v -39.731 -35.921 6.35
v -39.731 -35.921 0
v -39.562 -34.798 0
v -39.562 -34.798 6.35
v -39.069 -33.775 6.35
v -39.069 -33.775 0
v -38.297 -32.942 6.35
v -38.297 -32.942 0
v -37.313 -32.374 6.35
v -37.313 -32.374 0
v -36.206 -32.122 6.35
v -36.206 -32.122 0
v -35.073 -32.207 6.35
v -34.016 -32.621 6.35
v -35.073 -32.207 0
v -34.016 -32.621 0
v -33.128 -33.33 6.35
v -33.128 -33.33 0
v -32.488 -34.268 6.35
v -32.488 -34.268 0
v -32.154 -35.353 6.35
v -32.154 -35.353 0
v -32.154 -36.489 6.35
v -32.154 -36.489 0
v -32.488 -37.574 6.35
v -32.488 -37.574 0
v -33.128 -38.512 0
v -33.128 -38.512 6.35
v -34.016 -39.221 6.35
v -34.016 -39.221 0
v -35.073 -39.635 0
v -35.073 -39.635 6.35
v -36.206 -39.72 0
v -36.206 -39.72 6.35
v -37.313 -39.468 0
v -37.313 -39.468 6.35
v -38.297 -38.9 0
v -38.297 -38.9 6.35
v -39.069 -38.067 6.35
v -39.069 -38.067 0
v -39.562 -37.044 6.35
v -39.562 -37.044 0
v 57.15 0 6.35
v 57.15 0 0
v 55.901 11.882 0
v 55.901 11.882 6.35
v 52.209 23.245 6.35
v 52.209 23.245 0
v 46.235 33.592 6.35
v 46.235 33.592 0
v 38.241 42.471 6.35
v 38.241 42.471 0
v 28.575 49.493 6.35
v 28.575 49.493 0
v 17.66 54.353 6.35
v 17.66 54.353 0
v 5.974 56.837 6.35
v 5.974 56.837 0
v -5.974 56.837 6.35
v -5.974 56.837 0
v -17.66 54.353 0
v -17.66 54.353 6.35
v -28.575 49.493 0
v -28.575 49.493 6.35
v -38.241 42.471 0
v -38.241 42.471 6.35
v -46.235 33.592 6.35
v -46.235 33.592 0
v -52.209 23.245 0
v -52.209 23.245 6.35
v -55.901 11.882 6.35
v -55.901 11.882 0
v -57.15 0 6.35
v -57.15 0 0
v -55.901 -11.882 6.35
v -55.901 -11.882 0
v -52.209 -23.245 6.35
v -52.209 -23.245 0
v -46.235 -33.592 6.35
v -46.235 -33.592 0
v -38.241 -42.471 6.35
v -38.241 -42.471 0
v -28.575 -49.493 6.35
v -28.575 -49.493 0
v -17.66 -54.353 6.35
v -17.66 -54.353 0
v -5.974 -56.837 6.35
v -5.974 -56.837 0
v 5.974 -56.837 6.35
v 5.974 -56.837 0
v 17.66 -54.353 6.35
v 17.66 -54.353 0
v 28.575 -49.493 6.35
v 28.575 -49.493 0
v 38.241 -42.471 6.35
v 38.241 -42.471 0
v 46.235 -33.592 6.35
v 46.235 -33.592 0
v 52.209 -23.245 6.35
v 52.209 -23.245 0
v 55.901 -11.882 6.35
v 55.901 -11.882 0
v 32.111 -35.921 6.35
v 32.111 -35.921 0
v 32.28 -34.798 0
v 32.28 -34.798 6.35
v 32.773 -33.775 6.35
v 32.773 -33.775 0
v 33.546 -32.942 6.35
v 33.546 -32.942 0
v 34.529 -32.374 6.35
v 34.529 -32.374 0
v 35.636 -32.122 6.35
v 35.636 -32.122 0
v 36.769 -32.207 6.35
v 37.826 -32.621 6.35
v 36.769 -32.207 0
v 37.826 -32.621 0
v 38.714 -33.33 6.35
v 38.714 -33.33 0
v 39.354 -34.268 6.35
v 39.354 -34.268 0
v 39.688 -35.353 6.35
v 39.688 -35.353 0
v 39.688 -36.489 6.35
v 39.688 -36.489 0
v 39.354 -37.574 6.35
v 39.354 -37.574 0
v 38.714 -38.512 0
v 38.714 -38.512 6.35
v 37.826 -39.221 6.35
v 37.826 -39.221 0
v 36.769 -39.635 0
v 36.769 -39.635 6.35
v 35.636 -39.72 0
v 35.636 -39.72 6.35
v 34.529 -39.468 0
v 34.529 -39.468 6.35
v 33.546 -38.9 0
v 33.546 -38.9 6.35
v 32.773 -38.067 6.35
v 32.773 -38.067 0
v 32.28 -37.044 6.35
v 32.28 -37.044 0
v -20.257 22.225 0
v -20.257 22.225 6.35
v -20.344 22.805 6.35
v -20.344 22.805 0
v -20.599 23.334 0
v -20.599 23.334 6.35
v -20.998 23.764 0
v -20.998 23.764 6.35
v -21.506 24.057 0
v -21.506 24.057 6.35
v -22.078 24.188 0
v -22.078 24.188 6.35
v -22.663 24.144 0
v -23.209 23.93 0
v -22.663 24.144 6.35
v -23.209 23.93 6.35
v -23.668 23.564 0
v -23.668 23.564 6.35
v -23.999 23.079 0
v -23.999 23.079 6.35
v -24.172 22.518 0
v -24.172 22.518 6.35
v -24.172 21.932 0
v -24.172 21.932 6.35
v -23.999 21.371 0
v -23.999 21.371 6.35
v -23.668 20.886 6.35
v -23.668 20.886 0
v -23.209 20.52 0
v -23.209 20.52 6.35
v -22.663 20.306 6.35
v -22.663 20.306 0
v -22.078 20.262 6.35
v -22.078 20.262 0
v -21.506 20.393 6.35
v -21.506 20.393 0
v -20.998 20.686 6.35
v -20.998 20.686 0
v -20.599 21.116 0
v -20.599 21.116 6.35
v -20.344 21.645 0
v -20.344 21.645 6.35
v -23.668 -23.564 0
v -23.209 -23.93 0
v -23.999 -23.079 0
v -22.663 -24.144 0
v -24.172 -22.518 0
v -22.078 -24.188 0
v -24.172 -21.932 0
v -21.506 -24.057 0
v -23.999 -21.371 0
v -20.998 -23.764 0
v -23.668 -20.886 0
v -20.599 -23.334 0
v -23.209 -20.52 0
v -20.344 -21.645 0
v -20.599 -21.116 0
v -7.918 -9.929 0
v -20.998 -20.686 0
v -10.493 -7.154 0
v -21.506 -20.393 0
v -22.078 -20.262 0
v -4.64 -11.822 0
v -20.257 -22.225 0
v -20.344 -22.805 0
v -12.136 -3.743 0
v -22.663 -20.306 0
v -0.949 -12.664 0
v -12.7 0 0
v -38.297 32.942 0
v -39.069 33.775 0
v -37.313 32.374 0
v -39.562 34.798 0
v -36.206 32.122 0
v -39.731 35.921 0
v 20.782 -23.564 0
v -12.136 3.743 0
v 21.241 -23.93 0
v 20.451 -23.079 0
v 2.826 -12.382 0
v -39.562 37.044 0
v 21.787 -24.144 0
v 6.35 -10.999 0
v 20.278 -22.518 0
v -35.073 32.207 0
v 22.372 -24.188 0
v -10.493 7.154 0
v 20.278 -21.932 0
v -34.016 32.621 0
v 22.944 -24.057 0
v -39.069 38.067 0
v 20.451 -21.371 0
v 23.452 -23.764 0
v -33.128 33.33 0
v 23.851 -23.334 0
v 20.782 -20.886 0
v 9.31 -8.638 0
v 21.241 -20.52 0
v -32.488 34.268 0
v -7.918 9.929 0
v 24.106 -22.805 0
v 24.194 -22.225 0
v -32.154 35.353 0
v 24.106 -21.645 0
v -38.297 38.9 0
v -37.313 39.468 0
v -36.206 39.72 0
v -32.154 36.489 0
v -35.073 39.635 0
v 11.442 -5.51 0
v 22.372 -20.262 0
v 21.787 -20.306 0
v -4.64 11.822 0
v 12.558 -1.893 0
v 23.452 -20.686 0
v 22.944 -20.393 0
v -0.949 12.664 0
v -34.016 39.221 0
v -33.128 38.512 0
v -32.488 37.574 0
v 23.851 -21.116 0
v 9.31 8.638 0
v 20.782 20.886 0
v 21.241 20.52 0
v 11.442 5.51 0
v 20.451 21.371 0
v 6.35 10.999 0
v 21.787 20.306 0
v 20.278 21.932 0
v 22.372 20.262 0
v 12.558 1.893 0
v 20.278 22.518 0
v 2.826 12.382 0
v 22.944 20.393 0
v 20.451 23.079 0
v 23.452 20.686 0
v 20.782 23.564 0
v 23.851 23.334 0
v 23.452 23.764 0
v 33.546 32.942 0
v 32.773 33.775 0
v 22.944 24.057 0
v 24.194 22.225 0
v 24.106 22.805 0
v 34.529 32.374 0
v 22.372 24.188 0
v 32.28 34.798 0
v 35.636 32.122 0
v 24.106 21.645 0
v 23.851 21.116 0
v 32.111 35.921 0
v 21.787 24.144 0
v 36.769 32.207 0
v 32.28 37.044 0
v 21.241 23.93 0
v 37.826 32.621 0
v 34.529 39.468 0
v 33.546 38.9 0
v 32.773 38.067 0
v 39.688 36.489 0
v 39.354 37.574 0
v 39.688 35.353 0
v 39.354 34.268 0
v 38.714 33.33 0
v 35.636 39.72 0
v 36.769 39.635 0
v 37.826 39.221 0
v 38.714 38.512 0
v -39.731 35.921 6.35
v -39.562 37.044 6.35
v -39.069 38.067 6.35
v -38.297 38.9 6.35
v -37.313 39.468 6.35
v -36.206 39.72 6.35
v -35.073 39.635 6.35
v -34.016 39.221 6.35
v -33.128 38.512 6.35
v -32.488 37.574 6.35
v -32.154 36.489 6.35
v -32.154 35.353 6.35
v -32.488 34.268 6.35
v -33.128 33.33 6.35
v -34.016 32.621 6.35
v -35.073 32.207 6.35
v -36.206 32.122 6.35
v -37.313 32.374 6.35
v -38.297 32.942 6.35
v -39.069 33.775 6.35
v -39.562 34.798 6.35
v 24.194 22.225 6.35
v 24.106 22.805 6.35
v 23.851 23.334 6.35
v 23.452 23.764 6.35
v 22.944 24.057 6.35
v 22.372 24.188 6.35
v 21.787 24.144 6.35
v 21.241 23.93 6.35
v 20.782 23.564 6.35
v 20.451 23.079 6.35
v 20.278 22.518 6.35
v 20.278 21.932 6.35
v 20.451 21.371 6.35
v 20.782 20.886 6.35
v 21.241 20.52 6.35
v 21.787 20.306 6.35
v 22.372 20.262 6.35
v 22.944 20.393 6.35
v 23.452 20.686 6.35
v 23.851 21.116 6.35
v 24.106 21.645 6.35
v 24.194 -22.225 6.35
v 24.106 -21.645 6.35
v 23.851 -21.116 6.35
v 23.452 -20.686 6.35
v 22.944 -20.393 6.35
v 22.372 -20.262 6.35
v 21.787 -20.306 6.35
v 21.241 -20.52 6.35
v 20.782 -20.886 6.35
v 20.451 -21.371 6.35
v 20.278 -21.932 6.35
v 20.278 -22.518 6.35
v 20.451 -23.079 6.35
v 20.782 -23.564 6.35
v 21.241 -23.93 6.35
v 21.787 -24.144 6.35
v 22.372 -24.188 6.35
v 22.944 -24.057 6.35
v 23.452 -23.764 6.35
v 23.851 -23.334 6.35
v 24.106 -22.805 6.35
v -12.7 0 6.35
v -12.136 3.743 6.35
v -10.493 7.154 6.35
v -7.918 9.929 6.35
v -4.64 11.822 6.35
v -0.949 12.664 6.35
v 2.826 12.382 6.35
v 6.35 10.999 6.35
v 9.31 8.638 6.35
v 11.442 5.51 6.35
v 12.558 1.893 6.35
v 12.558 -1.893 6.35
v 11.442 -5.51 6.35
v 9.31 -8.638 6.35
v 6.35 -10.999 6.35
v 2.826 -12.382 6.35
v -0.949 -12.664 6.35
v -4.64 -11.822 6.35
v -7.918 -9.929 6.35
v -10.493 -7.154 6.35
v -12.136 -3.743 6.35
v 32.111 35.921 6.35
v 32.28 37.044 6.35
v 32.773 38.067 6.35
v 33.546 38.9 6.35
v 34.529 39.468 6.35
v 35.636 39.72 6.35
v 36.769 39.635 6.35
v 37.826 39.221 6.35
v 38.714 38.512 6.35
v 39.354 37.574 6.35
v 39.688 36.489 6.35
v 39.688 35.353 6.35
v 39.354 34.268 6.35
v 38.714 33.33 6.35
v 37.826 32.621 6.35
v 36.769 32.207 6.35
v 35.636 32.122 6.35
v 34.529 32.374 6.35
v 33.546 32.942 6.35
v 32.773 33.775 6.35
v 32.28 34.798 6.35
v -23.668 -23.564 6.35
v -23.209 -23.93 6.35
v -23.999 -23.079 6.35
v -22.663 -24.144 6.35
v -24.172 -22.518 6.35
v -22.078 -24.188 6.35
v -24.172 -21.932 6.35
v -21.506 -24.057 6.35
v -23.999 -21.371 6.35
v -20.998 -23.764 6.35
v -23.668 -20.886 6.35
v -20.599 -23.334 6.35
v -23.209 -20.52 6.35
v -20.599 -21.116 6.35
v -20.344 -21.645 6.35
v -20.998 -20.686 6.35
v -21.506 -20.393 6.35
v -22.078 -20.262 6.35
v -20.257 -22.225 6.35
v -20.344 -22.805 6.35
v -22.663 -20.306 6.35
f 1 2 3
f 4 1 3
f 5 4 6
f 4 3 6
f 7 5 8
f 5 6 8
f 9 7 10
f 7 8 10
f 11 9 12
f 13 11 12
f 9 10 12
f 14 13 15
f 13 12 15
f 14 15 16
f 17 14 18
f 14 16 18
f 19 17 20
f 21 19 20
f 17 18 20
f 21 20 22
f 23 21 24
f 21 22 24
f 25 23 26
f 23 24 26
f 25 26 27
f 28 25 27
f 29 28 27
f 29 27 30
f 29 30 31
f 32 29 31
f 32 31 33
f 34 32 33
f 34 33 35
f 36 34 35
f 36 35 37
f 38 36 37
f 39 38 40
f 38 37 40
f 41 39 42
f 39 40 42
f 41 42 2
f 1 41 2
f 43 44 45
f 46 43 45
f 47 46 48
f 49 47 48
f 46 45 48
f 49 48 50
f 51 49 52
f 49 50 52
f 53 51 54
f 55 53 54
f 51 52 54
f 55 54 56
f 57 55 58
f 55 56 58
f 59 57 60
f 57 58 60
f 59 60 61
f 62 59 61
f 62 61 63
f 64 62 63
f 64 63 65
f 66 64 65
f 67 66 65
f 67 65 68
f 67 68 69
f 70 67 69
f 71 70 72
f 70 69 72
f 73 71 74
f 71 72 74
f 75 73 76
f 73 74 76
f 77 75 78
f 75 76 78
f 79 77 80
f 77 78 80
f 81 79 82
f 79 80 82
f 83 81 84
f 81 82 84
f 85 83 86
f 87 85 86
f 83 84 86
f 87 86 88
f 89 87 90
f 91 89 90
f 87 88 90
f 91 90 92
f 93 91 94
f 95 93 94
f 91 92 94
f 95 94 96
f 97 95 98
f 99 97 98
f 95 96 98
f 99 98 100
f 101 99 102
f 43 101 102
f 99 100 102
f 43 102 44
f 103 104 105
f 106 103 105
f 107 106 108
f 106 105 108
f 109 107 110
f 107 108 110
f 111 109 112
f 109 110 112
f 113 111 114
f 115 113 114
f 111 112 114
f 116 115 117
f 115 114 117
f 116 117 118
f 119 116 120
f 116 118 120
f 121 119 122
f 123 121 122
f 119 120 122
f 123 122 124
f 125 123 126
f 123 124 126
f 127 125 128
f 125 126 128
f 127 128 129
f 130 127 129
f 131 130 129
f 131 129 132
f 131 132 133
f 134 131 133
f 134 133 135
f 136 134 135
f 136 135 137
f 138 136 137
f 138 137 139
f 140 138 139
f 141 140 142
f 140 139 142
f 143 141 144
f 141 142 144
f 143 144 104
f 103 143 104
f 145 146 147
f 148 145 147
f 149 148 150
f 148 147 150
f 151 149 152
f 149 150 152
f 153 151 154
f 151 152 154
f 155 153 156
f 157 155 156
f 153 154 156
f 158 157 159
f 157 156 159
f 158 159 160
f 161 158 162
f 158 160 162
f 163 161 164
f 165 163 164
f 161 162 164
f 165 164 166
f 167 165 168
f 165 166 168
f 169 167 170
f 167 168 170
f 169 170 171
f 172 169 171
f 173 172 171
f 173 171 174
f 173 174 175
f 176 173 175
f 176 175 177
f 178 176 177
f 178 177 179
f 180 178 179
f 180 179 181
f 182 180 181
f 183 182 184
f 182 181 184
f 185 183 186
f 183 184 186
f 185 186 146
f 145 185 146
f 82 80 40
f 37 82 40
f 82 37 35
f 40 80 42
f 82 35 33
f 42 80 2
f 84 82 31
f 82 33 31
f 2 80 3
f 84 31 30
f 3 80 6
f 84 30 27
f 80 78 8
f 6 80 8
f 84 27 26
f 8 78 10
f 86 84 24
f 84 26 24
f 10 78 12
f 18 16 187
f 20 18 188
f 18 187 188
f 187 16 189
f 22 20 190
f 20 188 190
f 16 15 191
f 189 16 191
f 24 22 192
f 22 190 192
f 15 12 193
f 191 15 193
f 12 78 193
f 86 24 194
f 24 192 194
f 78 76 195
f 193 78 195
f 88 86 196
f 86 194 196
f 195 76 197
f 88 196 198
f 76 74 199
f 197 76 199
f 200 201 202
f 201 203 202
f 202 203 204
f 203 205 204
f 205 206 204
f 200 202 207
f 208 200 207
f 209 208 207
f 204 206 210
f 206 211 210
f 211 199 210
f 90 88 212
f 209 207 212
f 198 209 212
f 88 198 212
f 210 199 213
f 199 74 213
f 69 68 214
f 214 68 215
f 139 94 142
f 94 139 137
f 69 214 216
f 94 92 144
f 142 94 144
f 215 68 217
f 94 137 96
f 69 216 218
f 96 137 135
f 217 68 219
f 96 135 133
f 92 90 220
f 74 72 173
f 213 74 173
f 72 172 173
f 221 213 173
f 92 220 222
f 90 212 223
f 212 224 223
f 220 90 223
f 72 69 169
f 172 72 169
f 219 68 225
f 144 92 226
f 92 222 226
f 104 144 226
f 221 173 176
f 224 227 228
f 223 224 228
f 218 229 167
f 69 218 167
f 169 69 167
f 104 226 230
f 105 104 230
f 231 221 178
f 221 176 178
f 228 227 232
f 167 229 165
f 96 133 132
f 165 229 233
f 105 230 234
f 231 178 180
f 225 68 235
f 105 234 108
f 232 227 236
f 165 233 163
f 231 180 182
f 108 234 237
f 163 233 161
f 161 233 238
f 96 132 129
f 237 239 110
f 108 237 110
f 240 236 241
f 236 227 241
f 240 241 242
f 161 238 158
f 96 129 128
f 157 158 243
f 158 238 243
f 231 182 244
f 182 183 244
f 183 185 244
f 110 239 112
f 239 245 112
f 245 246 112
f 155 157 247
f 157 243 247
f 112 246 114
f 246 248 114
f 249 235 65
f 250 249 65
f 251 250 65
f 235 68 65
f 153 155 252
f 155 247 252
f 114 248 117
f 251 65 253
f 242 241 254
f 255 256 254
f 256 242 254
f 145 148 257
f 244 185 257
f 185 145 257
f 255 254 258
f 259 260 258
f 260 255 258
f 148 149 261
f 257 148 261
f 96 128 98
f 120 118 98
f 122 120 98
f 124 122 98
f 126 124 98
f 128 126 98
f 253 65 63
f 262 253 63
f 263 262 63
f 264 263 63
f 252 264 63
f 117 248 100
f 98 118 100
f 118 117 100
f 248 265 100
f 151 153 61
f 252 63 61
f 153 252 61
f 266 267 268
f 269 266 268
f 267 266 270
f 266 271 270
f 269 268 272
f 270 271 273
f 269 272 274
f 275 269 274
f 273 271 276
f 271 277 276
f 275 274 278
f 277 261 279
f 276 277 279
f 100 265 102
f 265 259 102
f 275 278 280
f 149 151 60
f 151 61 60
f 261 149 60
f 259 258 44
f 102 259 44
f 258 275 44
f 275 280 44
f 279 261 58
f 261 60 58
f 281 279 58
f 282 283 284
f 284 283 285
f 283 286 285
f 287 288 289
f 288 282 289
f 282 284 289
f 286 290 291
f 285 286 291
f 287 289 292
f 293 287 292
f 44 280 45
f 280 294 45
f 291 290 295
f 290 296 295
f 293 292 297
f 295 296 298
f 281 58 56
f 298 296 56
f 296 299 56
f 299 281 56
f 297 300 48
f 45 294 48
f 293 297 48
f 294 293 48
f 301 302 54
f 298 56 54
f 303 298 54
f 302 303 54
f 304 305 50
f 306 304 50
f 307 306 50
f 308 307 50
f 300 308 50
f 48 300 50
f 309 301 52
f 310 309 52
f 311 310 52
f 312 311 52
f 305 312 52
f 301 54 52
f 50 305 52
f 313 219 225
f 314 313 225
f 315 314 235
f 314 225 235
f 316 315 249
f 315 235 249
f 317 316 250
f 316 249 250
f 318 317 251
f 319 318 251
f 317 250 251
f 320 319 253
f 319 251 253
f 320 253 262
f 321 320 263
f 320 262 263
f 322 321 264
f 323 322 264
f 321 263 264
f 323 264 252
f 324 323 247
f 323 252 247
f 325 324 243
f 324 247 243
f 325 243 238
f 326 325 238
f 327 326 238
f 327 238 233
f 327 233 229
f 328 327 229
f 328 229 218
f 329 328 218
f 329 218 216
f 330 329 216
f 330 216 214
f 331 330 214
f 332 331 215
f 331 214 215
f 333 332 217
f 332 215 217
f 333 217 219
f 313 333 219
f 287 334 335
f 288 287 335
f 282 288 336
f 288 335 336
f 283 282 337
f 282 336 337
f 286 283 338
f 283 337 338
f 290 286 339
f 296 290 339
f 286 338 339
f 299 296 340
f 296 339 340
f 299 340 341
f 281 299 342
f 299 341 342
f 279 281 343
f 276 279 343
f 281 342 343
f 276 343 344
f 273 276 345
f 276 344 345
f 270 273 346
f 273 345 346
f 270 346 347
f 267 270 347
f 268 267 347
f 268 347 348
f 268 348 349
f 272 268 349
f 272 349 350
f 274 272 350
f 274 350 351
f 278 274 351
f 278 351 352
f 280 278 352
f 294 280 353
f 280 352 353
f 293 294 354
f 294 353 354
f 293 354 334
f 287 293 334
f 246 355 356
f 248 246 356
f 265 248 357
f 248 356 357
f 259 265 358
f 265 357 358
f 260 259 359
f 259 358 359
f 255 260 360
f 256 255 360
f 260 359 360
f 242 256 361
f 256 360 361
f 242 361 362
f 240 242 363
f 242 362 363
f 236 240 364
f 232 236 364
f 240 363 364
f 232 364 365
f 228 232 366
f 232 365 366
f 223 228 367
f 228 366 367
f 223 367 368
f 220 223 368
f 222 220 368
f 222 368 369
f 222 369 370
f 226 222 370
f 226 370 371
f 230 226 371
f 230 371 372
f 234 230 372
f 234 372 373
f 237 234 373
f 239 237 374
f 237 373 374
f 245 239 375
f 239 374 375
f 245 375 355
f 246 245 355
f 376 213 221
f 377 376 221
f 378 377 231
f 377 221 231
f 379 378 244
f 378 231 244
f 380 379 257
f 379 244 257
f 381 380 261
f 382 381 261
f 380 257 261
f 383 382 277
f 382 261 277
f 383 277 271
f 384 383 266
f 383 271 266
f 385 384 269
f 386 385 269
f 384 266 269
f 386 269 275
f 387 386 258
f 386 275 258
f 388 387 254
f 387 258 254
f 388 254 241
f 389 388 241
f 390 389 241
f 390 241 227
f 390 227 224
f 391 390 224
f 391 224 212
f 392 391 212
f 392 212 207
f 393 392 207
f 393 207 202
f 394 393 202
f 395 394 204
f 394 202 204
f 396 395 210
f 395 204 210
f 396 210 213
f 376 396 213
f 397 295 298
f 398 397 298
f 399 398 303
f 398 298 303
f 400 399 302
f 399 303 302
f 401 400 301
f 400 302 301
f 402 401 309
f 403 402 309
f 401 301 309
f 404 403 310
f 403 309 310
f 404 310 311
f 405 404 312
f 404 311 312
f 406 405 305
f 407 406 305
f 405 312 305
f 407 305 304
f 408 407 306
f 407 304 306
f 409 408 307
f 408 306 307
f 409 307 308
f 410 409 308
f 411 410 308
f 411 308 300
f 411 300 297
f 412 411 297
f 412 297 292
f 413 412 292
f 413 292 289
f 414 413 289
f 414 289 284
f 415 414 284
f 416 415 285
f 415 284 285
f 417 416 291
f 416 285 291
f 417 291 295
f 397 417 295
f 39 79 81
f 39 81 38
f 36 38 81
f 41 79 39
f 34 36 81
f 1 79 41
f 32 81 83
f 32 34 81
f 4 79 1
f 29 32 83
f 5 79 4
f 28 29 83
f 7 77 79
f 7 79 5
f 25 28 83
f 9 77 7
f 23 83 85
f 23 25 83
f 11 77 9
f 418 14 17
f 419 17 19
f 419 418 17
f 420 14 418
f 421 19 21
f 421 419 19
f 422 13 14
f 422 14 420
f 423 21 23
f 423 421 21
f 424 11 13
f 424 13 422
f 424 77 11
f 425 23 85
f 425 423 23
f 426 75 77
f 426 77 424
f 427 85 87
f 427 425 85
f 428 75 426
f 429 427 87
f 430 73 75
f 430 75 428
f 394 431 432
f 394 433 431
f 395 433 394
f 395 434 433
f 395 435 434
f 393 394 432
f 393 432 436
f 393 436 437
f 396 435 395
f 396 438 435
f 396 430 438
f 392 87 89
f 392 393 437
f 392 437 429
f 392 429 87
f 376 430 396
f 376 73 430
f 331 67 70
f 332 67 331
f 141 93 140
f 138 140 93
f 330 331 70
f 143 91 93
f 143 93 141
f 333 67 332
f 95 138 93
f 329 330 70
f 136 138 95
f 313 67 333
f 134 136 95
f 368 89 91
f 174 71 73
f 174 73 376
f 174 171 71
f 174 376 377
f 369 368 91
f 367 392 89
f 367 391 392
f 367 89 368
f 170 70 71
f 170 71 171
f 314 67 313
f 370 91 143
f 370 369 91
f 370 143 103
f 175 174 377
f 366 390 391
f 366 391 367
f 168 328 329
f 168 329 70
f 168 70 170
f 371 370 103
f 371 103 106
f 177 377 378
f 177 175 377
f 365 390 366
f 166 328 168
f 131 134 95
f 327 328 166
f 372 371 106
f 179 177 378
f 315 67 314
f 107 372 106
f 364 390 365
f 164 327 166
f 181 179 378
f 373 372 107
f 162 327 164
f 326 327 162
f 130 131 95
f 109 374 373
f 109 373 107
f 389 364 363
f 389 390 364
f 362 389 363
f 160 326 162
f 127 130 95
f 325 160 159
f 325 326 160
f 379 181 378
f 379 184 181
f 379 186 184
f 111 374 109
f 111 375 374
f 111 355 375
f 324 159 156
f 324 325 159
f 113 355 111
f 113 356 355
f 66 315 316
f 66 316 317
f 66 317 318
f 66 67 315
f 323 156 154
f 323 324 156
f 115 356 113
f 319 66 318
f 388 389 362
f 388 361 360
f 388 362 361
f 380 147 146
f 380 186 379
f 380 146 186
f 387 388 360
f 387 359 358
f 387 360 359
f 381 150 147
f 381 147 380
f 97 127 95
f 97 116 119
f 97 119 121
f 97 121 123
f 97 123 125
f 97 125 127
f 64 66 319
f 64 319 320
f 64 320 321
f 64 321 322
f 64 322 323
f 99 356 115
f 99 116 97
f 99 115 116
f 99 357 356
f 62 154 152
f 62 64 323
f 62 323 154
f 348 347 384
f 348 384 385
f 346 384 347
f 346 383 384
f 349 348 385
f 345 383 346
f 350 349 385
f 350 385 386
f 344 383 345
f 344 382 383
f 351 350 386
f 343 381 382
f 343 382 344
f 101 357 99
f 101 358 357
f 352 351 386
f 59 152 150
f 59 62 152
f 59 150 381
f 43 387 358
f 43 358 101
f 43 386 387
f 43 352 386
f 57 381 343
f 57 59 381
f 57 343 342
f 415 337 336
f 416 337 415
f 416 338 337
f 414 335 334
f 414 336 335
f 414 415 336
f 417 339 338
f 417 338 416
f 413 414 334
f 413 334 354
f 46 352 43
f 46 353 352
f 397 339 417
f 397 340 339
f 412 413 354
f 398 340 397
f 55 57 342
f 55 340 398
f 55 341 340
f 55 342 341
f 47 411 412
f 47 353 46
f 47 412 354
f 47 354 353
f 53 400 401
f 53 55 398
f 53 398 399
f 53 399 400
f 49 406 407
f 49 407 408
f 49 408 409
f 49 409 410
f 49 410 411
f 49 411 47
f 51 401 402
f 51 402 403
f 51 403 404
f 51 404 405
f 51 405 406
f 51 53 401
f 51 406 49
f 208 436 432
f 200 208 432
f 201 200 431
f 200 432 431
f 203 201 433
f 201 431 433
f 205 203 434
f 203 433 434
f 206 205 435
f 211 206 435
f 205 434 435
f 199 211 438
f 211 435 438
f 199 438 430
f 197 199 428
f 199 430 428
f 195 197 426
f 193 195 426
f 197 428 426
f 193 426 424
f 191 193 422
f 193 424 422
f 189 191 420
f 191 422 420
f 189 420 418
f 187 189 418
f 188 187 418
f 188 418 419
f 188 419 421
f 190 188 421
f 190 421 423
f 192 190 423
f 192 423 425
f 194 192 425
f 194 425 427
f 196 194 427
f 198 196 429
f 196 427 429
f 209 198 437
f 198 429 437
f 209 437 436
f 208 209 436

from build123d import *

# Parameters (mm, degrees)
SKETCH3_R           = 57.15
BOSS_EXTRUDE2_DEPTH = 6.35
SKETCH4_R           = 3.81
SKETCH4_R_2         = 12.7
CUT_EXTRUDE1_DEPTH  = 6.35
SKETCH5_R           = 1.9685
CUT_EXTRUDE2_DEPTH  = 6.35


with BuildPart() as part:
    # Sketch3 → Boss-Extrude2 (new body)
    with BuildSketch(Plane.XY):
        Circle(SKETCH3_R)
    extrude(amount=BOSS_EXTRUDE2_DEPTH)

    # Sketch4 → Cut-Extrude1 (cut)
    with BuildSketch(Plane(origin=(0, 0, 0), x_dir=(-1, 0, 0), z_dir=(0, 0, -1))):
        with Locations((-35.921024484, 35.921024484)):
            Circle(SKETCH4_R)
        with Locations((35.921024484, 35.921024484)):
            Circle(SKETCH4_R)
        with Locations((35.921024484, -35.921024484)):
            Circle(SKETCH4_R)
        with Locations((-35.921024484, -35.921024484)):
            Circle(SKETCH4_R)
        Circle(SKETCH4_R_2)
    extrude(amount=-CUT_EXTRUDE1_DEPTH, mode=Mode.SUBTRACT)

    # Sketch5 → Cut-Extrude2 (cut)
    with BuildSketch(Plane.XY.offset(6.35)):
        with Locations((-22.225, 22.225)):
            Circle(SKETCH5_R)
        with Locations((22.225, 22.225)):
            Circle(SKETCH5_R)
        with Locations((22.225, -22.225)):
            Circle(SKETCH5_R)
        with Locations((-22.225, -22.225)):
            Circle(SKETCH5_R)
    extrude(amount=-CUT_EXTRUDE2_DEPTH, mode=Mode.SUBTRACT)


solid = part.part
